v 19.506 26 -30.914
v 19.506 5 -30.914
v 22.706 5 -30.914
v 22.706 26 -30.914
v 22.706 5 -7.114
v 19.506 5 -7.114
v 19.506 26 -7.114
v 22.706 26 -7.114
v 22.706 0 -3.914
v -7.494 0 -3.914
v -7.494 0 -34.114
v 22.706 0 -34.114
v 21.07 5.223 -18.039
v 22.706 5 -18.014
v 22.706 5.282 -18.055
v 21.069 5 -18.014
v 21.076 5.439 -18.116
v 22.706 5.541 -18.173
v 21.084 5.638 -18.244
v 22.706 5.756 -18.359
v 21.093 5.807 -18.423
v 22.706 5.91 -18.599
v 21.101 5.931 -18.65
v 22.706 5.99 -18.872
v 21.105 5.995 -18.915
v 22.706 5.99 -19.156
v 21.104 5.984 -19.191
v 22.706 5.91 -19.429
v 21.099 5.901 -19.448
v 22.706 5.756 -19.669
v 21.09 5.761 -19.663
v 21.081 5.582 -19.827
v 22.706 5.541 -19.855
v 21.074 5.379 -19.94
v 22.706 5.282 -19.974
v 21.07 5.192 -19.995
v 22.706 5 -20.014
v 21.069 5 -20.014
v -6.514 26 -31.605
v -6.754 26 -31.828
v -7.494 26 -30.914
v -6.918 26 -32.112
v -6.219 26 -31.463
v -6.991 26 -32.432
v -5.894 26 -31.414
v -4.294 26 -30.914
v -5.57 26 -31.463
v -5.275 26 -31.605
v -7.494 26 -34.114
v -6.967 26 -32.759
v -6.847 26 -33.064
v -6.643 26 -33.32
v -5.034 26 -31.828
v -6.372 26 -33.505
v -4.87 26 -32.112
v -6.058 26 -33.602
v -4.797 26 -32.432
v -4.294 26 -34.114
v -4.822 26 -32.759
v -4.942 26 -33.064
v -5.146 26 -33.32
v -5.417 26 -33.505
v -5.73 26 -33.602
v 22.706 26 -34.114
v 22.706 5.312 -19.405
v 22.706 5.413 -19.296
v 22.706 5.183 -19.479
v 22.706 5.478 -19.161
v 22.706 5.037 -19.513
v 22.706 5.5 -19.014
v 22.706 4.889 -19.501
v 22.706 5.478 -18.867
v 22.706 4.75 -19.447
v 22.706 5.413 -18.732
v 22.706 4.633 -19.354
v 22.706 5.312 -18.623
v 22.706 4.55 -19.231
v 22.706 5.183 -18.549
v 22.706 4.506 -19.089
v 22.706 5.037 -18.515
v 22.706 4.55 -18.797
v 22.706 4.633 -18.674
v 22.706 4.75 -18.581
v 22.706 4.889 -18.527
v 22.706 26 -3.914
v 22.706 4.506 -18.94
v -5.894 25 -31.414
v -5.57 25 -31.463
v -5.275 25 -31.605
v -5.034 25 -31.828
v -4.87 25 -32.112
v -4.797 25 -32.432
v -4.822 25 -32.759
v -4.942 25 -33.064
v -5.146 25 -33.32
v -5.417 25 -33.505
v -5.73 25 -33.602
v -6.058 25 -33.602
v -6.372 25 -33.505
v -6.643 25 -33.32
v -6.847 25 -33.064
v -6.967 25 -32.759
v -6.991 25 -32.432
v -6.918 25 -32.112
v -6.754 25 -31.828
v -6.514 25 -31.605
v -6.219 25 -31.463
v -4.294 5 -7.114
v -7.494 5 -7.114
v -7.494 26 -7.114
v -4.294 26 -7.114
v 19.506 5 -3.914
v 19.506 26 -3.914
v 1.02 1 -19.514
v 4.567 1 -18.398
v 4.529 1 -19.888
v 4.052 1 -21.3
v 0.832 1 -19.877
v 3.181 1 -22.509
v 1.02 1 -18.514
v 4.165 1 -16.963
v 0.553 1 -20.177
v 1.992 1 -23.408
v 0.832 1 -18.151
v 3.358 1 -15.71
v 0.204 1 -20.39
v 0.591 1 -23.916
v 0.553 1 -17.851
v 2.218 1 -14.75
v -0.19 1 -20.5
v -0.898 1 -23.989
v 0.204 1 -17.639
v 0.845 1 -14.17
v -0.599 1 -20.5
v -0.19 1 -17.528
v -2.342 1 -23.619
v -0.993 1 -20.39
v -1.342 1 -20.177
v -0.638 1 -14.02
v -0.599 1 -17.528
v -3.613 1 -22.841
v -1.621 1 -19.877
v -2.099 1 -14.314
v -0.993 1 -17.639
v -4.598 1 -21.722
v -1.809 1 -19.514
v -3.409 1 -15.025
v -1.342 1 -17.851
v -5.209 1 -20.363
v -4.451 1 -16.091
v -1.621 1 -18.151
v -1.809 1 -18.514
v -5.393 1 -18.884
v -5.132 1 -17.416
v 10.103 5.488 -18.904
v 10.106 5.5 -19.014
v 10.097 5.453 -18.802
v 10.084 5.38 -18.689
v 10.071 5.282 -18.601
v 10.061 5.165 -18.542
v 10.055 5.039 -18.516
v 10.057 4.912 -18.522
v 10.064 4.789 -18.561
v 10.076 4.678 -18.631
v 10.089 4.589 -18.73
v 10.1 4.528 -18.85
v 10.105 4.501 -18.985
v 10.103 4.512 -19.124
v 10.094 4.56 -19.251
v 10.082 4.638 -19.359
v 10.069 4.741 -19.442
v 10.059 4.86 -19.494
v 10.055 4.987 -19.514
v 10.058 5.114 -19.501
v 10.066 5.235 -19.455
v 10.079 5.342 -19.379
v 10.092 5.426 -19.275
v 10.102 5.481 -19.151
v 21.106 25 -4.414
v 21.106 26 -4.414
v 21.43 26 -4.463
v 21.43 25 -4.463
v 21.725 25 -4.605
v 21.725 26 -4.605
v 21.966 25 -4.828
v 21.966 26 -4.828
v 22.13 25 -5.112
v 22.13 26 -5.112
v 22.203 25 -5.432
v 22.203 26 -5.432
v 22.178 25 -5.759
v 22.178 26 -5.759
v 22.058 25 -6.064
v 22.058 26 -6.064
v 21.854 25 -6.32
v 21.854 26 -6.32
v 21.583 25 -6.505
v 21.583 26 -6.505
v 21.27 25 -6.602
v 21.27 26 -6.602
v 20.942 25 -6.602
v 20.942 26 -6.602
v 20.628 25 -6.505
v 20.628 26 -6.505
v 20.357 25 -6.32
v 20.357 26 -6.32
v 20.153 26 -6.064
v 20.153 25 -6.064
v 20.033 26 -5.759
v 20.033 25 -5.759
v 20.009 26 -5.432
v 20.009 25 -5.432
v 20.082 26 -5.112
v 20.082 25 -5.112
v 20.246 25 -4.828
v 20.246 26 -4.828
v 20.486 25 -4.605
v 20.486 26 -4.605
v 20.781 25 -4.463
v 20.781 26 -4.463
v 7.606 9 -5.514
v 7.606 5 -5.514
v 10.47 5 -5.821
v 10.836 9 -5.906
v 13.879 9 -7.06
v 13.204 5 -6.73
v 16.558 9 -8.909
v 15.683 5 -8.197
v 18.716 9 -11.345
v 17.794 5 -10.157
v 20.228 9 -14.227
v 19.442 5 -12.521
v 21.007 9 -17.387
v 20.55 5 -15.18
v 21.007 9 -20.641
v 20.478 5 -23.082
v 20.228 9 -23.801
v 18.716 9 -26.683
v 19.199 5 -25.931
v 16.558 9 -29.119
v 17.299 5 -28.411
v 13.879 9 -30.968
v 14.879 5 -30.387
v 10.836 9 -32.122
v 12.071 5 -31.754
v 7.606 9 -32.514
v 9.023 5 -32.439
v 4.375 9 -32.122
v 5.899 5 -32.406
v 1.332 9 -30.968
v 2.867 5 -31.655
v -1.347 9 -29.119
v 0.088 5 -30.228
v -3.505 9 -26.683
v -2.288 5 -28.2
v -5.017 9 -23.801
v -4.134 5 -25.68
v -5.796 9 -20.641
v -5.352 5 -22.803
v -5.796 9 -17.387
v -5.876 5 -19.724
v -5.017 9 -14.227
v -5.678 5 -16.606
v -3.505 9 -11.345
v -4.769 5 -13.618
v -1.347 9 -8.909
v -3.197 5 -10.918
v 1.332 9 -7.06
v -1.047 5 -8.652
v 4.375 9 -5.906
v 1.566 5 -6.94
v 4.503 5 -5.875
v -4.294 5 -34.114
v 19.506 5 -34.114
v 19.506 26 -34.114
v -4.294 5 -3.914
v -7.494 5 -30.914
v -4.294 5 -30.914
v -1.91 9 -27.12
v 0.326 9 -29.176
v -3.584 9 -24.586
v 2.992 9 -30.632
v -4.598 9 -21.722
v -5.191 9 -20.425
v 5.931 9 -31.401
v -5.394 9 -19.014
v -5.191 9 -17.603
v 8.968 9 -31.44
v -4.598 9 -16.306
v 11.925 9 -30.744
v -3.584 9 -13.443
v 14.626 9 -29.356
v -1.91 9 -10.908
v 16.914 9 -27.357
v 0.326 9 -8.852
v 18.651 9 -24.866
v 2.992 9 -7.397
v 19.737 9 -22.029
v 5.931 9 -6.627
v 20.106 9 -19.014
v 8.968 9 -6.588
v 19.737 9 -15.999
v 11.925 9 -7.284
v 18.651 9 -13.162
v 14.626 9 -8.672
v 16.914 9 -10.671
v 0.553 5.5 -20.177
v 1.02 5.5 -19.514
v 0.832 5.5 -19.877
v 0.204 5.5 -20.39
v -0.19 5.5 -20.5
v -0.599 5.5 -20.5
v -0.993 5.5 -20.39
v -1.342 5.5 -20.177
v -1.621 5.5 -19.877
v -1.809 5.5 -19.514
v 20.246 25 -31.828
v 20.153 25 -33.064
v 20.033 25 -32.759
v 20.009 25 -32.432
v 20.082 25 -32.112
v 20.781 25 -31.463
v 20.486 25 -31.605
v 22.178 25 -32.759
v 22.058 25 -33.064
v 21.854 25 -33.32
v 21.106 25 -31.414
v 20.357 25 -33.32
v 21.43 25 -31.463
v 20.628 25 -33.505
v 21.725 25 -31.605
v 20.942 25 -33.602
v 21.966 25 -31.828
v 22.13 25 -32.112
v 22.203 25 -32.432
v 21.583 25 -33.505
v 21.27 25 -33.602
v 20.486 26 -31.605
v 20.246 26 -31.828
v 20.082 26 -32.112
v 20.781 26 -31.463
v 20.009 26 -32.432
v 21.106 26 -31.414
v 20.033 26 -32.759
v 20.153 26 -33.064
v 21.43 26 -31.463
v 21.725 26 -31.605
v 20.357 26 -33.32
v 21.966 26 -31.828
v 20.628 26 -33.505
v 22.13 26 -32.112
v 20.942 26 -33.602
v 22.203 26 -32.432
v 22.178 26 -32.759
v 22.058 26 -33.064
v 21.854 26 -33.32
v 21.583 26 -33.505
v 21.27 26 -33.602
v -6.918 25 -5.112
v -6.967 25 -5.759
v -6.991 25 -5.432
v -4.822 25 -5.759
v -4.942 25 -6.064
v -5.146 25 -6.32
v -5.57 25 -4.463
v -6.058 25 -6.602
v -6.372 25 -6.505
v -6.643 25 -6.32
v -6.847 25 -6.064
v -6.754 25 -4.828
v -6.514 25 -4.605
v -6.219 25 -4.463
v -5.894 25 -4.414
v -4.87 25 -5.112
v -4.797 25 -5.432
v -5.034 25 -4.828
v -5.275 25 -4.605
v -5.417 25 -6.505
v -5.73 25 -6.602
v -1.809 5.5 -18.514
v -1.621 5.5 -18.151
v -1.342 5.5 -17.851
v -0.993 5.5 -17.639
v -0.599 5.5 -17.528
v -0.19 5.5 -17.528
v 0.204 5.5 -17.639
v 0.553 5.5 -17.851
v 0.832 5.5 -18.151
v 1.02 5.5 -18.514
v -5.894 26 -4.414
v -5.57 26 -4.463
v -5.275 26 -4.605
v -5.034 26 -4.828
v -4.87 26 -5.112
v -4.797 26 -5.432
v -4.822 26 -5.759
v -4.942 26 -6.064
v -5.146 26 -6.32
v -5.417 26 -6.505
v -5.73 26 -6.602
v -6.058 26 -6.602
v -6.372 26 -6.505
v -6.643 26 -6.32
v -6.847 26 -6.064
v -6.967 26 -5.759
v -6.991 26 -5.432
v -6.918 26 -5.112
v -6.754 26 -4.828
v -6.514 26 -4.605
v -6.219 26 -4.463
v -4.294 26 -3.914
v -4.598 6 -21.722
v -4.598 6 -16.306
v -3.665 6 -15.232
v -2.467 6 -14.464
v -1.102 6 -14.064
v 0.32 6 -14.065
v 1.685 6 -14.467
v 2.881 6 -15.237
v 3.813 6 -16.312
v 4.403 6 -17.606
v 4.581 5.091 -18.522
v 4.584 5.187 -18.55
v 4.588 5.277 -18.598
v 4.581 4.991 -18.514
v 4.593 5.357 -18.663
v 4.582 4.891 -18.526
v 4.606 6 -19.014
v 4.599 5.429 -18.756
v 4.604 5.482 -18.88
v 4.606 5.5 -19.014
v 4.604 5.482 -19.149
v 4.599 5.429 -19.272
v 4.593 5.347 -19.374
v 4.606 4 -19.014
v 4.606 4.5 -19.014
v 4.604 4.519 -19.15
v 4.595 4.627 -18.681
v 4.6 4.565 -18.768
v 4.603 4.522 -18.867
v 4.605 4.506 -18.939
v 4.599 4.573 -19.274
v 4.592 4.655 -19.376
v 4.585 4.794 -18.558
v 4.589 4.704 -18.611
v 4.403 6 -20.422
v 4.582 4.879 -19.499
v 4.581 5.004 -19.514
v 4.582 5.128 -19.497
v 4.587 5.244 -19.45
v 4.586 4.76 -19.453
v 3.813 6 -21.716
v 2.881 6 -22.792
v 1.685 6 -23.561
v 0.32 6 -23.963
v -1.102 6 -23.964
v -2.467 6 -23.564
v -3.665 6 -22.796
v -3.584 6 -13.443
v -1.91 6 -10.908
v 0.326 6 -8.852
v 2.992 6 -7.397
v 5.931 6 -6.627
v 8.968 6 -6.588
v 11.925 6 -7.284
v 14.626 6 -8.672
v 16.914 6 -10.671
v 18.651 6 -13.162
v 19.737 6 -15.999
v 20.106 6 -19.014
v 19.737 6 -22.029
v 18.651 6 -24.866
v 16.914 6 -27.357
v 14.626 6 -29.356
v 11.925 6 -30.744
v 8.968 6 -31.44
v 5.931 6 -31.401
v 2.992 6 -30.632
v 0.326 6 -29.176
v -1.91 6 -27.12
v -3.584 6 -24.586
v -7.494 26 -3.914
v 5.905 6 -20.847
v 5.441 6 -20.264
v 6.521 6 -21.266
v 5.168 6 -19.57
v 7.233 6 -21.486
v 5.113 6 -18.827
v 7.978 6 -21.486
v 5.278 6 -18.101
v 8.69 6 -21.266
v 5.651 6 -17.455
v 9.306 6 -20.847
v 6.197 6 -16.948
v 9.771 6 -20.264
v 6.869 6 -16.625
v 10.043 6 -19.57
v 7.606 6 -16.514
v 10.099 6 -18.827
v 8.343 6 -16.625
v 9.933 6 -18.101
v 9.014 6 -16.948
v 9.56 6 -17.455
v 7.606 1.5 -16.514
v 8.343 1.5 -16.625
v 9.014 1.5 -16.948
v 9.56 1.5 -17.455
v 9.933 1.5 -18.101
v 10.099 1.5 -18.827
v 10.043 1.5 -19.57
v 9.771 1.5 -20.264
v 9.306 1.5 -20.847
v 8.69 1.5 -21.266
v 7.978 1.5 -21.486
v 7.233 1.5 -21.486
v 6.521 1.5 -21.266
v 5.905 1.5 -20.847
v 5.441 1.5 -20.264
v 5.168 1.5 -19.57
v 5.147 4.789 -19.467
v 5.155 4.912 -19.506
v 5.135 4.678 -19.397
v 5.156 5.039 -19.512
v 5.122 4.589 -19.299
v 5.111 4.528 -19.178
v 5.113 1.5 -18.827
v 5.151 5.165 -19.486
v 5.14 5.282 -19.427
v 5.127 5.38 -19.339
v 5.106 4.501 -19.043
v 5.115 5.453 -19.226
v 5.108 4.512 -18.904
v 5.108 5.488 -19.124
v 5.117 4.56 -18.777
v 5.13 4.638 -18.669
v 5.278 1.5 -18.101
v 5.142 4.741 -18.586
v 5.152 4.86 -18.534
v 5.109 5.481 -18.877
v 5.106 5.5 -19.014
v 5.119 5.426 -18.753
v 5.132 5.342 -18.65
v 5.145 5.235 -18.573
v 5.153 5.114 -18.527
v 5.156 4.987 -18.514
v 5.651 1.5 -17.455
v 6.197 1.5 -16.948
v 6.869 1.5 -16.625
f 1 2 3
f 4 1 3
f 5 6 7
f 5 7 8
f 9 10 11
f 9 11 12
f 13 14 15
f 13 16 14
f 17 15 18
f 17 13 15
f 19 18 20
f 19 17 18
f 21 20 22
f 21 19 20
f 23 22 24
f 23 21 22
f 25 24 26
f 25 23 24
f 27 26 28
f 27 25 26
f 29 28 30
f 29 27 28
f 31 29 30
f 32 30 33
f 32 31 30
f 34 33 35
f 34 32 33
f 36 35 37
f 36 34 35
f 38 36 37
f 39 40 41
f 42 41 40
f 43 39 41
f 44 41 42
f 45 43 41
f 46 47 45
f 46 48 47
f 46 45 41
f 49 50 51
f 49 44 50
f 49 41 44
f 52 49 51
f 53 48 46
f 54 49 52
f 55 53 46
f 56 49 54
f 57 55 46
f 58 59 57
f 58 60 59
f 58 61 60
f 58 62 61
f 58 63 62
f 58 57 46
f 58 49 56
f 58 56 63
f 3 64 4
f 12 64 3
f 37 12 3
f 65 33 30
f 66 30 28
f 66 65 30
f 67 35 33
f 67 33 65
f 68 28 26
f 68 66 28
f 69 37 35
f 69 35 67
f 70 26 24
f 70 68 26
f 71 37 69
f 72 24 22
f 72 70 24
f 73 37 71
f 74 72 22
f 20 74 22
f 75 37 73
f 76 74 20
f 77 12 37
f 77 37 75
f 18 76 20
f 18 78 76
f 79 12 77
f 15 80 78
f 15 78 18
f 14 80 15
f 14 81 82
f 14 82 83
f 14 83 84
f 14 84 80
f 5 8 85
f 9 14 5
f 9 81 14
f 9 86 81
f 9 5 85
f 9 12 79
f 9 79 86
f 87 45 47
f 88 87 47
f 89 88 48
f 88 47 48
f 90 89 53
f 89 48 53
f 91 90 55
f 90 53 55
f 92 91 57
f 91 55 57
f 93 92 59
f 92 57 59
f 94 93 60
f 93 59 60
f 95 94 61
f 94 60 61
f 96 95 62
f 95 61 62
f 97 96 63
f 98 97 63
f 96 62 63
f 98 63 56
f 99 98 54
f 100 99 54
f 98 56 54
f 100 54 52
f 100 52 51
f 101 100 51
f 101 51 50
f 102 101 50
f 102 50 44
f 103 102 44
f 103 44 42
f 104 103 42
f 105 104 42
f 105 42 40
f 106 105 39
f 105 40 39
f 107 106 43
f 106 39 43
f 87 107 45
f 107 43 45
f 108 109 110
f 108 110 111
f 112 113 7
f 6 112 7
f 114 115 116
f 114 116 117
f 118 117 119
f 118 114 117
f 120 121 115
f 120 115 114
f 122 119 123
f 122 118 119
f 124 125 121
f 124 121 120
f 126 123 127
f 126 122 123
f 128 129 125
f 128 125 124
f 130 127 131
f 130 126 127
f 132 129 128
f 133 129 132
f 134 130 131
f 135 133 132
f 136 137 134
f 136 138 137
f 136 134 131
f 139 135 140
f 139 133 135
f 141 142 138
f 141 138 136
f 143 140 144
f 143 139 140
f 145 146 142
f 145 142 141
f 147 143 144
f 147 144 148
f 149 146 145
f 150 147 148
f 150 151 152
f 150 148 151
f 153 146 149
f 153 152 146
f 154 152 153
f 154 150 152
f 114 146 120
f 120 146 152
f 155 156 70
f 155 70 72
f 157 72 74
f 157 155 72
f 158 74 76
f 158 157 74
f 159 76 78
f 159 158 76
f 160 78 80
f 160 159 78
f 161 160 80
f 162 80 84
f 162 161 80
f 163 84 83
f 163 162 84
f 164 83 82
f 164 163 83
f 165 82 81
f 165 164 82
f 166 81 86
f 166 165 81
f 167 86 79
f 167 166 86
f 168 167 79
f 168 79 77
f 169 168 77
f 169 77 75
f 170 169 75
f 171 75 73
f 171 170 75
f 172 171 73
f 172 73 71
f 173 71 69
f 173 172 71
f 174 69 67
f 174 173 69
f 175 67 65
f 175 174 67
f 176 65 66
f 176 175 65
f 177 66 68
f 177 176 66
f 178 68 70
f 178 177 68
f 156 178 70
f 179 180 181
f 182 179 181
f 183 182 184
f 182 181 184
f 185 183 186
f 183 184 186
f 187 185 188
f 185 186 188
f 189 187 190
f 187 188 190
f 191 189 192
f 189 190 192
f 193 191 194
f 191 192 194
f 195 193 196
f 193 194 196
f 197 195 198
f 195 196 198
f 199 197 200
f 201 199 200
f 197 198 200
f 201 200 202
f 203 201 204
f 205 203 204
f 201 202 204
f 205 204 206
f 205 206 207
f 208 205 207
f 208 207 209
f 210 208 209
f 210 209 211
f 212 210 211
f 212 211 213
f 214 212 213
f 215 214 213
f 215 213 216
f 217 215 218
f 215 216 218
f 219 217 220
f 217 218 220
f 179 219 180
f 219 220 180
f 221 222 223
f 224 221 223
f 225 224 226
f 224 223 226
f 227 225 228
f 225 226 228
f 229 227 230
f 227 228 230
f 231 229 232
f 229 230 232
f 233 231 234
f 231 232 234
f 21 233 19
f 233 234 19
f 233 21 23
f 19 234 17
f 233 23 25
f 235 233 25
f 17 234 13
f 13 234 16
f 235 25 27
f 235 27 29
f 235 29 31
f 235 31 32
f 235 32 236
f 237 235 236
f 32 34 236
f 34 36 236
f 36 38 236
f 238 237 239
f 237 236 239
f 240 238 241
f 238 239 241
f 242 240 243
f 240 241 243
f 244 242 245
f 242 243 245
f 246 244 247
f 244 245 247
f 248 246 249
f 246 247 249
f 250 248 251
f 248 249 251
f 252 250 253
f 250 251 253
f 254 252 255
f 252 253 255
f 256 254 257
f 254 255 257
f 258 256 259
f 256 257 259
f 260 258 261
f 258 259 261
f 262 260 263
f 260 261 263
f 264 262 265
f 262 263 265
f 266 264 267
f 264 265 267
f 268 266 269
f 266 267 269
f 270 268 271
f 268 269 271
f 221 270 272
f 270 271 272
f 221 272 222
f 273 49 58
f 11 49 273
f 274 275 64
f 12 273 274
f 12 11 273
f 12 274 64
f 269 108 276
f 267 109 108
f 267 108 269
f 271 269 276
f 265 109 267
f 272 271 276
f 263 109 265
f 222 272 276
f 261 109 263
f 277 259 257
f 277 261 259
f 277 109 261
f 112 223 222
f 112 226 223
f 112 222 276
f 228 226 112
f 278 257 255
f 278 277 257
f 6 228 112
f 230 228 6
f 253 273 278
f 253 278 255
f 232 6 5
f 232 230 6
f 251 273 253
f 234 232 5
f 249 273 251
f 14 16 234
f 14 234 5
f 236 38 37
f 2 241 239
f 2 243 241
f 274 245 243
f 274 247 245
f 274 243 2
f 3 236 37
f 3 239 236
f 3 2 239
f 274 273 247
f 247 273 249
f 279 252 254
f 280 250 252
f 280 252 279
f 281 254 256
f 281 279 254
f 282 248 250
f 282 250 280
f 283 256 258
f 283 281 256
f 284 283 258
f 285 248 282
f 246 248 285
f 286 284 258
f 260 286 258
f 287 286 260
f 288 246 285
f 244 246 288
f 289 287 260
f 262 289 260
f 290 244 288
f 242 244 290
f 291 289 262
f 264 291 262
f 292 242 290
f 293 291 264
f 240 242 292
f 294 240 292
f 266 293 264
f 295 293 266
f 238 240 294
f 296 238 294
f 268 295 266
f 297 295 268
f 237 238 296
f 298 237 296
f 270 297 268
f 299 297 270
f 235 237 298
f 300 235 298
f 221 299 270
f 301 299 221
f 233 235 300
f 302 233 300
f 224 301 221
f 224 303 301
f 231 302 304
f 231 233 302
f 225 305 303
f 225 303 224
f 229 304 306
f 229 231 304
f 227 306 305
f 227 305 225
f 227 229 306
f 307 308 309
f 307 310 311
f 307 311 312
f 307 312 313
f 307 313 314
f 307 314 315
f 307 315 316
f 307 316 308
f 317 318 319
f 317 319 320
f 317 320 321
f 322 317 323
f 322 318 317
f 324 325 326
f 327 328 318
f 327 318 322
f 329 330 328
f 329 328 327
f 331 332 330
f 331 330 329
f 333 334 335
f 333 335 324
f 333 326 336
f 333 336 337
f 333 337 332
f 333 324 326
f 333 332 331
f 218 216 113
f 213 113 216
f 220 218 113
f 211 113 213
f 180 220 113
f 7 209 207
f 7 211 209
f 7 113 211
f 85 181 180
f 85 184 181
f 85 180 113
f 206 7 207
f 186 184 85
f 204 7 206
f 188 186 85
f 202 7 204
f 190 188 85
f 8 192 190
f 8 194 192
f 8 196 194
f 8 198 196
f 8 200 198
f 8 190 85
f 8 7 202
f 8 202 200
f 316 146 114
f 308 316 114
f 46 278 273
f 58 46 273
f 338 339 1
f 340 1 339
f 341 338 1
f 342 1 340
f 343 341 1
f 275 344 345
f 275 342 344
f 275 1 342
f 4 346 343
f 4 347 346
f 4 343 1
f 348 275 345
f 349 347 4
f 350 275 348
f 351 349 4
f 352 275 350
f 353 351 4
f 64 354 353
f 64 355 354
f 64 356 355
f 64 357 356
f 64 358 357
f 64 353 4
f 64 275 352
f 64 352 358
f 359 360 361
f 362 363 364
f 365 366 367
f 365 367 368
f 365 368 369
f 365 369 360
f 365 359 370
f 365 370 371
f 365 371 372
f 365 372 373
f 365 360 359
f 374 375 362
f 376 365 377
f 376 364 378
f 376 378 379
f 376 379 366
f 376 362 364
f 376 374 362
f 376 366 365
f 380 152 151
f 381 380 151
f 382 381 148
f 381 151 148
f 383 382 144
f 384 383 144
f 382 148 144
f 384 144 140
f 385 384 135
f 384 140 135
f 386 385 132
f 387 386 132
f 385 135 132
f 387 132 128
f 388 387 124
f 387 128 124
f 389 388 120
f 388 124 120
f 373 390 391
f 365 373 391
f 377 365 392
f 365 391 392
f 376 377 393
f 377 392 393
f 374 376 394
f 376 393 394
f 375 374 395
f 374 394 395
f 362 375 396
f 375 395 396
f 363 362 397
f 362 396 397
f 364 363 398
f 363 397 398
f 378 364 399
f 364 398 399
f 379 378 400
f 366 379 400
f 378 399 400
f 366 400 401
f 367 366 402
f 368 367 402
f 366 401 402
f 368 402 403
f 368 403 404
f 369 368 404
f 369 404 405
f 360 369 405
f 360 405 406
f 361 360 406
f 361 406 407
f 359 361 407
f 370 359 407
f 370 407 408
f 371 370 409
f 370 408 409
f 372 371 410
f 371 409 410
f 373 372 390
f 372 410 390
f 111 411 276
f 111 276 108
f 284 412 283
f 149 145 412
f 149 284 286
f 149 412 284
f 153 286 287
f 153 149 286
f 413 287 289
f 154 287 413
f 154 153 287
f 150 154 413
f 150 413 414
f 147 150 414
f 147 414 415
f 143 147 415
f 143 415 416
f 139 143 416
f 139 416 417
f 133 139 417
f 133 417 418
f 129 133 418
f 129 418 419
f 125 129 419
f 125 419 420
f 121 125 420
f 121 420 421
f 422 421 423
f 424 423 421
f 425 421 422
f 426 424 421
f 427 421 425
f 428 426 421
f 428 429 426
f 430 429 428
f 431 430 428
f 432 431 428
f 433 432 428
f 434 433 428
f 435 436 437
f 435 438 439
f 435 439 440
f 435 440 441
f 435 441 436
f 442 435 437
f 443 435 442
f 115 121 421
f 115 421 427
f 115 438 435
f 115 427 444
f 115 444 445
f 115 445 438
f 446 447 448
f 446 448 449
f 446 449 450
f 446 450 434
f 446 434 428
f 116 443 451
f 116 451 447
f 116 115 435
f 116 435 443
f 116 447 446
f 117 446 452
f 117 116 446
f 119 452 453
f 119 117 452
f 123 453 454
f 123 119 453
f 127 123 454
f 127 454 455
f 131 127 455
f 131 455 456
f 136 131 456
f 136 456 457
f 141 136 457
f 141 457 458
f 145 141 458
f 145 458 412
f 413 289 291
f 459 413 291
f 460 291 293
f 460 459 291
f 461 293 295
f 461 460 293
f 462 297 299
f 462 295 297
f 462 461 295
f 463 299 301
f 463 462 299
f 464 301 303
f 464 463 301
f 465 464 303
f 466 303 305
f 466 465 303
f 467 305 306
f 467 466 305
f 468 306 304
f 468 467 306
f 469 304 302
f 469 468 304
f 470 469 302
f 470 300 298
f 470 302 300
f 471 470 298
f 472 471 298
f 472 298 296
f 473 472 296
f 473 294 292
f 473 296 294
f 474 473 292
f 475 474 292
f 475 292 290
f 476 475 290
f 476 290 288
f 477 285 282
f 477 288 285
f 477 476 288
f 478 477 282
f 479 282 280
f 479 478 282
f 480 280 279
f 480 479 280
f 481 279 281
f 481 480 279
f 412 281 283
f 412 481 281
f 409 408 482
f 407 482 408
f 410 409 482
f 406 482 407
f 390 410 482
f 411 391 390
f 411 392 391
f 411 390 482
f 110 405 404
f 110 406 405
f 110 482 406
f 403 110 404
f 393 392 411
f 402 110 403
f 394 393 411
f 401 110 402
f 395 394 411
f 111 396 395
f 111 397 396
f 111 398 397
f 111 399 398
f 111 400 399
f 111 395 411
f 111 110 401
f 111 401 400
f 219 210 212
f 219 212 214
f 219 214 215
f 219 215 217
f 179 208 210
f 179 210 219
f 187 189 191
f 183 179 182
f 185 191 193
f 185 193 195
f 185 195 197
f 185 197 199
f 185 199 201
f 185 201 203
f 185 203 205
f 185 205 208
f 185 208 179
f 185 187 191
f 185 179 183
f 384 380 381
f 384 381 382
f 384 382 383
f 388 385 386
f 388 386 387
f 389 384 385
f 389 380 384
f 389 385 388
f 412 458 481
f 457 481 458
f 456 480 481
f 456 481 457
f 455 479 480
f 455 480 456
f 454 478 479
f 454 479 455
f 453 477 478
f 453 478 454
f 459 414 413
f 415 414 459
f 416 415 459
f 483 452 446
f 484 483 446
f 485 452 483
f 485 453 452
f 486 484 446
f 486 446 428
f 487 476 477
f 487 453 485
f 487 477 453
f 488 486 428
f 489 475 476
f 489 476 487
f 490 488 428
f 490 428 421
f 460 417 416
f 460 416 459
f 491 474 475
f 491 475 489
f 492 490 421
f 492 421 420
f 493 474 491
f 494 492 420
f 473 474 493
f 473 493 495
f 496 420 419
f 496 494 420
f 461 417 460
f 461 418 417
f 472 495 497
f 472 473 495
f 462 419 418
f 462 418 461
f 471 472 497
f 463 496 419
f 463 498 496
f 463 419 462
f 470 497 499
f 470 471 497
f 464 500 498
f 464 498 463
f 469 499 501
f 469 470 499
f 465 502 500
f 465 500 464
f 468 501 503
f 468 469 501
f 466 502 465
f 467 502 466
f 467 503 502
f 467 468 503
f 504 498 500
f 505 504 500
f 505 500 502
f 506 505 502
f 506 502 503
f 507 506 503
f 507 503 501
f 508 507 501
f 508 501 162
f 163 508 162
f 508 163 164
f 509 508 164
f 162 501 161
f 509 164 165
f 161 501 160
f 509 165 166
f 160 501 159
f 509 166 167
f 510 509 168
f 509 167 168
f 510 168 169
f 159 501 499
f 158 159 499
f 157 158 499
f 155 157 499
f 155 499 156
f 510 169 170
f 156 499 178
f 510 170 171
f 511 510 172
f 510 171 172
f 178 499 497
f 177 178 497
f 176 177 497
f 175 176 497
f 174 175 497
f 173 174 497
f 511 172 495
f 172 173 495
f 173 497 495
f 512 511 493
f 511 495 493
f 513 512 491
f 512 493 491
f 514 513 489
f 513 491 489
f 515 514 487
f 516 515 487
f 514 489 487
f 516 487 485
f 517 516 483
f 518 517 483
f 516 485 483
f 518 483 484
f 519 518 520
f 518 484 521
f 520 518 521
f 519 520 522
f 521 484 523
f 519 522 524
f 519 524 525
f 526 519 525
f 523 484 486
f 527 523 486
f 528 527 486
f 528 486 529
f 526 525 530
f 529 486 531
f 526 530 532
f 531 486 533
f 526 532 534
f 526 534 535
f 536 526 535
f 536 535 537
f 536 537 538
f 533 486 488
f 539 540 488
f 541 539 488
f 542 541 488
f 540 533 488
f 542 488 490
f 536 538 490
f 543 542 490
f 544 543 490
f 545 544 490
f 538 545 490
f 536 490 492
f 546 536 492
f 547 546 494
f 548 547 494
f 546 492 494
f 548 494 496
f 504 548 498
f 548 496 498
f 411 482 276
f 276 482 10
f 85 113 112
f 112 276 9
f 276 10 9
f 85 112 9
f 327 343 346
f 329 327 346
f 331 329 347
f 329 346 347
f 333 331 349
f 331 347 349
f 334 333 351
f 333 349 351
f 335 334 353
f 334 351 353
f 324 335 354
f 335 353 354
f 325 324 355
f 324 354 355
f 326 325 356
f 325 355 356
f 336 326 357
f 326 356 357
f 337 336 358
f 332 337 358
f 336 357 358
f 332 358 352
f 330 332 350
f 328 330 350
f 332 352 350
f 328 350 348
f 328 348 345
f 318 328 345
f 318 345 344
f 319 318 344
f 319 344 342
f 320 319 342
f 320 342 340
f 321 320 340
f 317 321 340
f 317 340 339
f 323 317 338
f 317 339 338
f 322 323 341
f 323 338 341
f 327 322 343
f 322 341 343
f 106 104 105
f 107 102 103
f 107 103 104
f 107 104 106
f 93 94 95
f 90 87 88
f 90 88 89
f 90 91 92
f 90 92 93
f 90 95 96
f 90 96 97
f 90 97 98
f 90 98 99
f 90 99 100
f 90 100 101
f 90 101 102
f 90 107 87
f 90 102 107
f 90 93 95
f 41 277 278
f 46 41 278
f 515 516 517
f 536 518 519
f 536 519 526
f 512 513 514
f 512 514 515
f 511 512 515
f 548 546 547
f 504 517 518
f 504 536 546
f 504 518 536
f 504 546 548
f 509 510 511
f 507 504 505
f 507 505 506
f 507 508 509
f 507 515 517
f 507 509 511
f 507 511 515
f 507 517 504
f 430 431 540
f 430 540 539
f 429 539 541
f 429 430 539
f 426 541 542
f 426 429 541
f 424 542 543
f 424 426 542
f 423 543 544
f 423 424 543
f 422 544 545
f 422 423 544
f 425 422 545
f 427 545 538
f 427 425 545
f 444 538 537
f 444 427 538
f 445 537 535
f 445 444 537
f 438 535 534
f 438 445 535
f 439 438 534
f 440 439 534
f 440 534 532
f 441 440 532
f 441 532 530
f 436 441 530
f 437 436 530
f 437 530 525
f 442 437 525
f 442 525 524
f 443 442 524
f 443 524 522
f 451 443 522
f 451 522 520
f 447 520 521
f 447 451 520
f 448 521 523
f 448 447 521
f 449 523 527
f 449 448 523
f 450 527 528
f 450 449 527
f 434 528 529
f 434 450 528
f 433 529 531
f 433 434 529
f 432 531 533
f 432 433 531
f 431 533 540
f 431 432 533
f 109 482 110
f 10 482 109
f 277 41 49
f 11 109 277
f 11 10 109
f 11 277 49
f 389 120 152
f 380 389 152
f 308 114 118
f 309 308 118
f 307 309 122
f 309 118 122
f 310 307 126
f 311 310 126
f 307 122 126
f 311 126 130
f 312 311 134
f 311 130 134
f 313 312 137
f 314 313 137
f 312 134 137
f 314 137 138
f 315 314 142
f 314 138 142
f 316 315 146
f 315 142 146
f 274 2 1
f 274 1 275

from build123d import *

# Parameters (mm, degrees)
SKETCH1_W               = 30.2
SKETCH1_H               = 30.2
BOSS_EXTRUDE1_DEPTH     = 5
SKETCH2_R               = 13.5
BOSS_EXTRUDE2_DEPTH     = 1
SKETCH3_R               = 2.5
CUT_EXTRUDE1_DEPTH      = 4.5
SKETCH4_R               = 13.5
SKETCH4_R_2             = 12.5
BOSS_EXTRUDE3_DEPTH     = 3
CUT_EXTRUDE2_DEPTH      = 5
CUT_EXTRUDE2_DEPTH_BACK = 5
SKETCH5_R               = 5
BOSS_EXTRUDE4_DEPTH     = 4.5
SKETCH7_R               = 1
SKETCH7_R_2             = 0.5
CUT_SWEEP1_START        = 4.580551388
CUT_SWEEP1_OUTLINE_R    = 0.5
CUT_SWEEP1_DEPTH        = 18.125062915
SKETCH10_R              = 2.5
CUT_EXTRUDE3_DEPTH      = 3
SKETCH12_W              = 3.2
SKETCH12_H              = 3.2
BOSS_EXTRUDE5_DEPTH     = 21
SKETCH15_R              = 1.1
CUT_EXTRUDE4_DEPTH      = 1


# Read off the part's stored shape, not the designer's step: Cut-Sweep1
with BuildPart() as part:
    # Sketch1 → Boss-Extrude1 (new body)
    with BuildSketch(Plane(origin=(0, 0, 0), x_dir=(1, 0, 0), z_dir=(0, 1, 0))):
        with Locations((7.605614303, 19.014035757)):
            Rectangle(SKETCH1_W, SKETCH1_H)
    extrude(amount=BOSS_EXTRUDE1_DEPTH)

    # Sketch2 → Boss-Extrude2 (add)
    with BuildSketch(Plane(origin=(0, 5, 0), x_dir=(1, 0, 0), z_dir=(0, 1, 0))):
        with Locations(Location((7.605614303, 19.014035757, 0), (0, 0, 270))):
            Circle(SKETCH2_R)
    extrude(amount=BOSS_EXTRUDE2_DEPTH)

    # Sketch3 → Cut-Extrude1 (cut)
    with BuildSketch(Plane(origin=(0, 6, 0), x_dir=(1, 0, 0), z_dir=(0, 1, 0))):
        with Locations(Location((7.605614303, 19.014035757, 0), (0, 0, 270))):
            Circle(SKETCH3_R)
    extrude(amount=-CUT_EXTRUDE1_DEPTH, mode=Mode.SUBTRACT)

    # Sketch4 → Boss-Extrude3 (add)
    with BuildSketch(Plane(origin=(0, 6, 0), x_dir=(1, 0, 0), z_dir=(0, 1, 0))):
        with Locations(Location((7.605614303, 19.014035757, 0), (0, 0, 270))):
            Circle(SKETCH4_R)
        with Locations(Location((7.605614303, 19.014035757, 0), (0, 0, 270))):
            Circle(SKETCH4_R_2, mode=Mode.SUBTRACT)
    extrude(amount=BOSS_EXTRUDE3_DEPTH)

    # Sketch5 → Cut-Extrude2 (cut, two sides: drawn at the far end of the back side and taken through both)
    with BuildSketch(Plane(origin=(0, 6, 0), x_dir=(1, 0, 0), z_dir=(0, 1, 0)).offset(-CUT_EXTRUDE2_DEPTH_BACK)):
        with Locations(Location((-0.394385697, 19.014035757, 0), (0, 0, 147.20617704))):
            Circle(SKETCH5_R)
    extrude(amount=CUT_EXTRUDE2_DEPTH + CUT_EXTRUDE2_DEPTH_BACK, mode=Mode.SUBTRACT)

    # Sketch6 → Boss-Extrude4 (add)
    with BuildSketch(Plane(origin=(0, 1, 0), x_dir=(1, 0, 0), z_dir=(0, 1, 0))):
        with BuildLine():
            ThreePointArc((1.019827865, 19.514035757), (-0.394385697, 20.514035757), (-1.80859926, 19.514035757))
            Line((-1.80859926, 19.514035757), (1.019827865, 19.514035757))
        make_face()
        with BuildLine():
            Line((1.019827865, 18.514035757), (-1.80859926, 18.514035757))
            ThreePointArc((-1.80859926, 18.514035757), (-0.394385697, 17.514035757), (1.019827865, 18.514035757))
        make_face()
    extrude(amount=BOSS_EXTRUDE4_DEPTH)

    # Sweep1: sweep along a path in Sketch8
    with BuildLine(Plane(origin=(0, 5, 0), x_dir=(1, 0, 0), z_dir=(0, 1, 0))) as sweep1_path:
        Line((22.705614303, 19.014035757), (4.605614303, 19.014035757))
    # Sketch7 → Sweep1 (sweep)
    with BuildSketch(Plane(origin=(22.705614303, 0, 0), x_dir=(0, 0, -1), z_dir=(1, 0, 0))):
        with Locations((19.014035757, 5)):
            Circle(SKETCH7_R)
        with Locations((19.014035757, 5)):
            Circle(SKETCH7_R_2, mode=Mode.SUBTRACT)
    sweep(path=sweep1_path.line)

    # Cut-Sweep1 outline → Cut-Sweep1 (cut)
    with BuildSketch(Plane.YZ.offset(CUT_SWEEP1_START)):
        with Locations((5, -19.014035757)):
            Circle(CUT_SWEEP1_OUTLINE_R)
    extrude(amount=CUT_SWEEP1_DEPTH, mode=Mode.SUBTRACT)

    # Sketch10 → Cut-Extrude3 (cut)
    with BuildSketch(Plane(origin=(0, 6, 0), x_dir=(1, 0, 0), z_dir=(0, 1, 0))):
        with Locations(Location((7.605614303, 19.014035757, 0), (0, 0, 270))):
            Circle(SKETCH10_R)
    extrude(amount=-CUT_EXTRUDE3_DEPTH, mode=Mode.SUBTRACT)

    # Sketch12 → Boss-Extrude5 (add)
    with BuildSketch(Plane(origin=(0, 5, 0), x_dir=(1, 0, 0), z_dir=(0, 1, 0))):
        with Locations((-5.894385697, 5.514035757)):
            Rectangle(SKETCH12_W, SKETCH12_H)
        with Locations((21.105614303, 5.514035757)):
            Rectangle(SKETCH12_W, SKETCH12_H)
        with Locations((21.105614303, 32.514035757)):
            Rectangle(SKETCH12_W, SKETCH12_H)
        with Locations((-5.894385697, 32.514035757)):
            Rectangle(SKETCH12_W, SKETCH12_H)
    extrude(amount=BOSS_EXTRUDE5_DEPTH)

    # Sketch15 → Cut-Extrude4 (cut)
    with BuildSketch(Plane(origin=(0, 26, 0), x_dir=(1, 0, 0), z_dir=(0, 1, 0))):
        with Locations(Location((-5.894385697, 5.514035757, 0), (0, 0, 270))):
            Circle(SKETCH15_R)
        with Locations(Location((-5.894385697, 32.514035757, 0), (0, 0, 270))):
            Circle(SKETCH15_R)
        with Locations(Location((21.105614303, 32.514035757, 0), (0, 0, 270))):
            Circle(SKETCH15_R)
        with Locations(Location((21.105614303, 5.514035757, 0), (0, 0, 270))):
            Circle(SKETCH15_R)
    extrude(amount=-CUT_EXTRUDE4_DEPTH, mode=Mode.SUBTRACT)


solid = part.part
